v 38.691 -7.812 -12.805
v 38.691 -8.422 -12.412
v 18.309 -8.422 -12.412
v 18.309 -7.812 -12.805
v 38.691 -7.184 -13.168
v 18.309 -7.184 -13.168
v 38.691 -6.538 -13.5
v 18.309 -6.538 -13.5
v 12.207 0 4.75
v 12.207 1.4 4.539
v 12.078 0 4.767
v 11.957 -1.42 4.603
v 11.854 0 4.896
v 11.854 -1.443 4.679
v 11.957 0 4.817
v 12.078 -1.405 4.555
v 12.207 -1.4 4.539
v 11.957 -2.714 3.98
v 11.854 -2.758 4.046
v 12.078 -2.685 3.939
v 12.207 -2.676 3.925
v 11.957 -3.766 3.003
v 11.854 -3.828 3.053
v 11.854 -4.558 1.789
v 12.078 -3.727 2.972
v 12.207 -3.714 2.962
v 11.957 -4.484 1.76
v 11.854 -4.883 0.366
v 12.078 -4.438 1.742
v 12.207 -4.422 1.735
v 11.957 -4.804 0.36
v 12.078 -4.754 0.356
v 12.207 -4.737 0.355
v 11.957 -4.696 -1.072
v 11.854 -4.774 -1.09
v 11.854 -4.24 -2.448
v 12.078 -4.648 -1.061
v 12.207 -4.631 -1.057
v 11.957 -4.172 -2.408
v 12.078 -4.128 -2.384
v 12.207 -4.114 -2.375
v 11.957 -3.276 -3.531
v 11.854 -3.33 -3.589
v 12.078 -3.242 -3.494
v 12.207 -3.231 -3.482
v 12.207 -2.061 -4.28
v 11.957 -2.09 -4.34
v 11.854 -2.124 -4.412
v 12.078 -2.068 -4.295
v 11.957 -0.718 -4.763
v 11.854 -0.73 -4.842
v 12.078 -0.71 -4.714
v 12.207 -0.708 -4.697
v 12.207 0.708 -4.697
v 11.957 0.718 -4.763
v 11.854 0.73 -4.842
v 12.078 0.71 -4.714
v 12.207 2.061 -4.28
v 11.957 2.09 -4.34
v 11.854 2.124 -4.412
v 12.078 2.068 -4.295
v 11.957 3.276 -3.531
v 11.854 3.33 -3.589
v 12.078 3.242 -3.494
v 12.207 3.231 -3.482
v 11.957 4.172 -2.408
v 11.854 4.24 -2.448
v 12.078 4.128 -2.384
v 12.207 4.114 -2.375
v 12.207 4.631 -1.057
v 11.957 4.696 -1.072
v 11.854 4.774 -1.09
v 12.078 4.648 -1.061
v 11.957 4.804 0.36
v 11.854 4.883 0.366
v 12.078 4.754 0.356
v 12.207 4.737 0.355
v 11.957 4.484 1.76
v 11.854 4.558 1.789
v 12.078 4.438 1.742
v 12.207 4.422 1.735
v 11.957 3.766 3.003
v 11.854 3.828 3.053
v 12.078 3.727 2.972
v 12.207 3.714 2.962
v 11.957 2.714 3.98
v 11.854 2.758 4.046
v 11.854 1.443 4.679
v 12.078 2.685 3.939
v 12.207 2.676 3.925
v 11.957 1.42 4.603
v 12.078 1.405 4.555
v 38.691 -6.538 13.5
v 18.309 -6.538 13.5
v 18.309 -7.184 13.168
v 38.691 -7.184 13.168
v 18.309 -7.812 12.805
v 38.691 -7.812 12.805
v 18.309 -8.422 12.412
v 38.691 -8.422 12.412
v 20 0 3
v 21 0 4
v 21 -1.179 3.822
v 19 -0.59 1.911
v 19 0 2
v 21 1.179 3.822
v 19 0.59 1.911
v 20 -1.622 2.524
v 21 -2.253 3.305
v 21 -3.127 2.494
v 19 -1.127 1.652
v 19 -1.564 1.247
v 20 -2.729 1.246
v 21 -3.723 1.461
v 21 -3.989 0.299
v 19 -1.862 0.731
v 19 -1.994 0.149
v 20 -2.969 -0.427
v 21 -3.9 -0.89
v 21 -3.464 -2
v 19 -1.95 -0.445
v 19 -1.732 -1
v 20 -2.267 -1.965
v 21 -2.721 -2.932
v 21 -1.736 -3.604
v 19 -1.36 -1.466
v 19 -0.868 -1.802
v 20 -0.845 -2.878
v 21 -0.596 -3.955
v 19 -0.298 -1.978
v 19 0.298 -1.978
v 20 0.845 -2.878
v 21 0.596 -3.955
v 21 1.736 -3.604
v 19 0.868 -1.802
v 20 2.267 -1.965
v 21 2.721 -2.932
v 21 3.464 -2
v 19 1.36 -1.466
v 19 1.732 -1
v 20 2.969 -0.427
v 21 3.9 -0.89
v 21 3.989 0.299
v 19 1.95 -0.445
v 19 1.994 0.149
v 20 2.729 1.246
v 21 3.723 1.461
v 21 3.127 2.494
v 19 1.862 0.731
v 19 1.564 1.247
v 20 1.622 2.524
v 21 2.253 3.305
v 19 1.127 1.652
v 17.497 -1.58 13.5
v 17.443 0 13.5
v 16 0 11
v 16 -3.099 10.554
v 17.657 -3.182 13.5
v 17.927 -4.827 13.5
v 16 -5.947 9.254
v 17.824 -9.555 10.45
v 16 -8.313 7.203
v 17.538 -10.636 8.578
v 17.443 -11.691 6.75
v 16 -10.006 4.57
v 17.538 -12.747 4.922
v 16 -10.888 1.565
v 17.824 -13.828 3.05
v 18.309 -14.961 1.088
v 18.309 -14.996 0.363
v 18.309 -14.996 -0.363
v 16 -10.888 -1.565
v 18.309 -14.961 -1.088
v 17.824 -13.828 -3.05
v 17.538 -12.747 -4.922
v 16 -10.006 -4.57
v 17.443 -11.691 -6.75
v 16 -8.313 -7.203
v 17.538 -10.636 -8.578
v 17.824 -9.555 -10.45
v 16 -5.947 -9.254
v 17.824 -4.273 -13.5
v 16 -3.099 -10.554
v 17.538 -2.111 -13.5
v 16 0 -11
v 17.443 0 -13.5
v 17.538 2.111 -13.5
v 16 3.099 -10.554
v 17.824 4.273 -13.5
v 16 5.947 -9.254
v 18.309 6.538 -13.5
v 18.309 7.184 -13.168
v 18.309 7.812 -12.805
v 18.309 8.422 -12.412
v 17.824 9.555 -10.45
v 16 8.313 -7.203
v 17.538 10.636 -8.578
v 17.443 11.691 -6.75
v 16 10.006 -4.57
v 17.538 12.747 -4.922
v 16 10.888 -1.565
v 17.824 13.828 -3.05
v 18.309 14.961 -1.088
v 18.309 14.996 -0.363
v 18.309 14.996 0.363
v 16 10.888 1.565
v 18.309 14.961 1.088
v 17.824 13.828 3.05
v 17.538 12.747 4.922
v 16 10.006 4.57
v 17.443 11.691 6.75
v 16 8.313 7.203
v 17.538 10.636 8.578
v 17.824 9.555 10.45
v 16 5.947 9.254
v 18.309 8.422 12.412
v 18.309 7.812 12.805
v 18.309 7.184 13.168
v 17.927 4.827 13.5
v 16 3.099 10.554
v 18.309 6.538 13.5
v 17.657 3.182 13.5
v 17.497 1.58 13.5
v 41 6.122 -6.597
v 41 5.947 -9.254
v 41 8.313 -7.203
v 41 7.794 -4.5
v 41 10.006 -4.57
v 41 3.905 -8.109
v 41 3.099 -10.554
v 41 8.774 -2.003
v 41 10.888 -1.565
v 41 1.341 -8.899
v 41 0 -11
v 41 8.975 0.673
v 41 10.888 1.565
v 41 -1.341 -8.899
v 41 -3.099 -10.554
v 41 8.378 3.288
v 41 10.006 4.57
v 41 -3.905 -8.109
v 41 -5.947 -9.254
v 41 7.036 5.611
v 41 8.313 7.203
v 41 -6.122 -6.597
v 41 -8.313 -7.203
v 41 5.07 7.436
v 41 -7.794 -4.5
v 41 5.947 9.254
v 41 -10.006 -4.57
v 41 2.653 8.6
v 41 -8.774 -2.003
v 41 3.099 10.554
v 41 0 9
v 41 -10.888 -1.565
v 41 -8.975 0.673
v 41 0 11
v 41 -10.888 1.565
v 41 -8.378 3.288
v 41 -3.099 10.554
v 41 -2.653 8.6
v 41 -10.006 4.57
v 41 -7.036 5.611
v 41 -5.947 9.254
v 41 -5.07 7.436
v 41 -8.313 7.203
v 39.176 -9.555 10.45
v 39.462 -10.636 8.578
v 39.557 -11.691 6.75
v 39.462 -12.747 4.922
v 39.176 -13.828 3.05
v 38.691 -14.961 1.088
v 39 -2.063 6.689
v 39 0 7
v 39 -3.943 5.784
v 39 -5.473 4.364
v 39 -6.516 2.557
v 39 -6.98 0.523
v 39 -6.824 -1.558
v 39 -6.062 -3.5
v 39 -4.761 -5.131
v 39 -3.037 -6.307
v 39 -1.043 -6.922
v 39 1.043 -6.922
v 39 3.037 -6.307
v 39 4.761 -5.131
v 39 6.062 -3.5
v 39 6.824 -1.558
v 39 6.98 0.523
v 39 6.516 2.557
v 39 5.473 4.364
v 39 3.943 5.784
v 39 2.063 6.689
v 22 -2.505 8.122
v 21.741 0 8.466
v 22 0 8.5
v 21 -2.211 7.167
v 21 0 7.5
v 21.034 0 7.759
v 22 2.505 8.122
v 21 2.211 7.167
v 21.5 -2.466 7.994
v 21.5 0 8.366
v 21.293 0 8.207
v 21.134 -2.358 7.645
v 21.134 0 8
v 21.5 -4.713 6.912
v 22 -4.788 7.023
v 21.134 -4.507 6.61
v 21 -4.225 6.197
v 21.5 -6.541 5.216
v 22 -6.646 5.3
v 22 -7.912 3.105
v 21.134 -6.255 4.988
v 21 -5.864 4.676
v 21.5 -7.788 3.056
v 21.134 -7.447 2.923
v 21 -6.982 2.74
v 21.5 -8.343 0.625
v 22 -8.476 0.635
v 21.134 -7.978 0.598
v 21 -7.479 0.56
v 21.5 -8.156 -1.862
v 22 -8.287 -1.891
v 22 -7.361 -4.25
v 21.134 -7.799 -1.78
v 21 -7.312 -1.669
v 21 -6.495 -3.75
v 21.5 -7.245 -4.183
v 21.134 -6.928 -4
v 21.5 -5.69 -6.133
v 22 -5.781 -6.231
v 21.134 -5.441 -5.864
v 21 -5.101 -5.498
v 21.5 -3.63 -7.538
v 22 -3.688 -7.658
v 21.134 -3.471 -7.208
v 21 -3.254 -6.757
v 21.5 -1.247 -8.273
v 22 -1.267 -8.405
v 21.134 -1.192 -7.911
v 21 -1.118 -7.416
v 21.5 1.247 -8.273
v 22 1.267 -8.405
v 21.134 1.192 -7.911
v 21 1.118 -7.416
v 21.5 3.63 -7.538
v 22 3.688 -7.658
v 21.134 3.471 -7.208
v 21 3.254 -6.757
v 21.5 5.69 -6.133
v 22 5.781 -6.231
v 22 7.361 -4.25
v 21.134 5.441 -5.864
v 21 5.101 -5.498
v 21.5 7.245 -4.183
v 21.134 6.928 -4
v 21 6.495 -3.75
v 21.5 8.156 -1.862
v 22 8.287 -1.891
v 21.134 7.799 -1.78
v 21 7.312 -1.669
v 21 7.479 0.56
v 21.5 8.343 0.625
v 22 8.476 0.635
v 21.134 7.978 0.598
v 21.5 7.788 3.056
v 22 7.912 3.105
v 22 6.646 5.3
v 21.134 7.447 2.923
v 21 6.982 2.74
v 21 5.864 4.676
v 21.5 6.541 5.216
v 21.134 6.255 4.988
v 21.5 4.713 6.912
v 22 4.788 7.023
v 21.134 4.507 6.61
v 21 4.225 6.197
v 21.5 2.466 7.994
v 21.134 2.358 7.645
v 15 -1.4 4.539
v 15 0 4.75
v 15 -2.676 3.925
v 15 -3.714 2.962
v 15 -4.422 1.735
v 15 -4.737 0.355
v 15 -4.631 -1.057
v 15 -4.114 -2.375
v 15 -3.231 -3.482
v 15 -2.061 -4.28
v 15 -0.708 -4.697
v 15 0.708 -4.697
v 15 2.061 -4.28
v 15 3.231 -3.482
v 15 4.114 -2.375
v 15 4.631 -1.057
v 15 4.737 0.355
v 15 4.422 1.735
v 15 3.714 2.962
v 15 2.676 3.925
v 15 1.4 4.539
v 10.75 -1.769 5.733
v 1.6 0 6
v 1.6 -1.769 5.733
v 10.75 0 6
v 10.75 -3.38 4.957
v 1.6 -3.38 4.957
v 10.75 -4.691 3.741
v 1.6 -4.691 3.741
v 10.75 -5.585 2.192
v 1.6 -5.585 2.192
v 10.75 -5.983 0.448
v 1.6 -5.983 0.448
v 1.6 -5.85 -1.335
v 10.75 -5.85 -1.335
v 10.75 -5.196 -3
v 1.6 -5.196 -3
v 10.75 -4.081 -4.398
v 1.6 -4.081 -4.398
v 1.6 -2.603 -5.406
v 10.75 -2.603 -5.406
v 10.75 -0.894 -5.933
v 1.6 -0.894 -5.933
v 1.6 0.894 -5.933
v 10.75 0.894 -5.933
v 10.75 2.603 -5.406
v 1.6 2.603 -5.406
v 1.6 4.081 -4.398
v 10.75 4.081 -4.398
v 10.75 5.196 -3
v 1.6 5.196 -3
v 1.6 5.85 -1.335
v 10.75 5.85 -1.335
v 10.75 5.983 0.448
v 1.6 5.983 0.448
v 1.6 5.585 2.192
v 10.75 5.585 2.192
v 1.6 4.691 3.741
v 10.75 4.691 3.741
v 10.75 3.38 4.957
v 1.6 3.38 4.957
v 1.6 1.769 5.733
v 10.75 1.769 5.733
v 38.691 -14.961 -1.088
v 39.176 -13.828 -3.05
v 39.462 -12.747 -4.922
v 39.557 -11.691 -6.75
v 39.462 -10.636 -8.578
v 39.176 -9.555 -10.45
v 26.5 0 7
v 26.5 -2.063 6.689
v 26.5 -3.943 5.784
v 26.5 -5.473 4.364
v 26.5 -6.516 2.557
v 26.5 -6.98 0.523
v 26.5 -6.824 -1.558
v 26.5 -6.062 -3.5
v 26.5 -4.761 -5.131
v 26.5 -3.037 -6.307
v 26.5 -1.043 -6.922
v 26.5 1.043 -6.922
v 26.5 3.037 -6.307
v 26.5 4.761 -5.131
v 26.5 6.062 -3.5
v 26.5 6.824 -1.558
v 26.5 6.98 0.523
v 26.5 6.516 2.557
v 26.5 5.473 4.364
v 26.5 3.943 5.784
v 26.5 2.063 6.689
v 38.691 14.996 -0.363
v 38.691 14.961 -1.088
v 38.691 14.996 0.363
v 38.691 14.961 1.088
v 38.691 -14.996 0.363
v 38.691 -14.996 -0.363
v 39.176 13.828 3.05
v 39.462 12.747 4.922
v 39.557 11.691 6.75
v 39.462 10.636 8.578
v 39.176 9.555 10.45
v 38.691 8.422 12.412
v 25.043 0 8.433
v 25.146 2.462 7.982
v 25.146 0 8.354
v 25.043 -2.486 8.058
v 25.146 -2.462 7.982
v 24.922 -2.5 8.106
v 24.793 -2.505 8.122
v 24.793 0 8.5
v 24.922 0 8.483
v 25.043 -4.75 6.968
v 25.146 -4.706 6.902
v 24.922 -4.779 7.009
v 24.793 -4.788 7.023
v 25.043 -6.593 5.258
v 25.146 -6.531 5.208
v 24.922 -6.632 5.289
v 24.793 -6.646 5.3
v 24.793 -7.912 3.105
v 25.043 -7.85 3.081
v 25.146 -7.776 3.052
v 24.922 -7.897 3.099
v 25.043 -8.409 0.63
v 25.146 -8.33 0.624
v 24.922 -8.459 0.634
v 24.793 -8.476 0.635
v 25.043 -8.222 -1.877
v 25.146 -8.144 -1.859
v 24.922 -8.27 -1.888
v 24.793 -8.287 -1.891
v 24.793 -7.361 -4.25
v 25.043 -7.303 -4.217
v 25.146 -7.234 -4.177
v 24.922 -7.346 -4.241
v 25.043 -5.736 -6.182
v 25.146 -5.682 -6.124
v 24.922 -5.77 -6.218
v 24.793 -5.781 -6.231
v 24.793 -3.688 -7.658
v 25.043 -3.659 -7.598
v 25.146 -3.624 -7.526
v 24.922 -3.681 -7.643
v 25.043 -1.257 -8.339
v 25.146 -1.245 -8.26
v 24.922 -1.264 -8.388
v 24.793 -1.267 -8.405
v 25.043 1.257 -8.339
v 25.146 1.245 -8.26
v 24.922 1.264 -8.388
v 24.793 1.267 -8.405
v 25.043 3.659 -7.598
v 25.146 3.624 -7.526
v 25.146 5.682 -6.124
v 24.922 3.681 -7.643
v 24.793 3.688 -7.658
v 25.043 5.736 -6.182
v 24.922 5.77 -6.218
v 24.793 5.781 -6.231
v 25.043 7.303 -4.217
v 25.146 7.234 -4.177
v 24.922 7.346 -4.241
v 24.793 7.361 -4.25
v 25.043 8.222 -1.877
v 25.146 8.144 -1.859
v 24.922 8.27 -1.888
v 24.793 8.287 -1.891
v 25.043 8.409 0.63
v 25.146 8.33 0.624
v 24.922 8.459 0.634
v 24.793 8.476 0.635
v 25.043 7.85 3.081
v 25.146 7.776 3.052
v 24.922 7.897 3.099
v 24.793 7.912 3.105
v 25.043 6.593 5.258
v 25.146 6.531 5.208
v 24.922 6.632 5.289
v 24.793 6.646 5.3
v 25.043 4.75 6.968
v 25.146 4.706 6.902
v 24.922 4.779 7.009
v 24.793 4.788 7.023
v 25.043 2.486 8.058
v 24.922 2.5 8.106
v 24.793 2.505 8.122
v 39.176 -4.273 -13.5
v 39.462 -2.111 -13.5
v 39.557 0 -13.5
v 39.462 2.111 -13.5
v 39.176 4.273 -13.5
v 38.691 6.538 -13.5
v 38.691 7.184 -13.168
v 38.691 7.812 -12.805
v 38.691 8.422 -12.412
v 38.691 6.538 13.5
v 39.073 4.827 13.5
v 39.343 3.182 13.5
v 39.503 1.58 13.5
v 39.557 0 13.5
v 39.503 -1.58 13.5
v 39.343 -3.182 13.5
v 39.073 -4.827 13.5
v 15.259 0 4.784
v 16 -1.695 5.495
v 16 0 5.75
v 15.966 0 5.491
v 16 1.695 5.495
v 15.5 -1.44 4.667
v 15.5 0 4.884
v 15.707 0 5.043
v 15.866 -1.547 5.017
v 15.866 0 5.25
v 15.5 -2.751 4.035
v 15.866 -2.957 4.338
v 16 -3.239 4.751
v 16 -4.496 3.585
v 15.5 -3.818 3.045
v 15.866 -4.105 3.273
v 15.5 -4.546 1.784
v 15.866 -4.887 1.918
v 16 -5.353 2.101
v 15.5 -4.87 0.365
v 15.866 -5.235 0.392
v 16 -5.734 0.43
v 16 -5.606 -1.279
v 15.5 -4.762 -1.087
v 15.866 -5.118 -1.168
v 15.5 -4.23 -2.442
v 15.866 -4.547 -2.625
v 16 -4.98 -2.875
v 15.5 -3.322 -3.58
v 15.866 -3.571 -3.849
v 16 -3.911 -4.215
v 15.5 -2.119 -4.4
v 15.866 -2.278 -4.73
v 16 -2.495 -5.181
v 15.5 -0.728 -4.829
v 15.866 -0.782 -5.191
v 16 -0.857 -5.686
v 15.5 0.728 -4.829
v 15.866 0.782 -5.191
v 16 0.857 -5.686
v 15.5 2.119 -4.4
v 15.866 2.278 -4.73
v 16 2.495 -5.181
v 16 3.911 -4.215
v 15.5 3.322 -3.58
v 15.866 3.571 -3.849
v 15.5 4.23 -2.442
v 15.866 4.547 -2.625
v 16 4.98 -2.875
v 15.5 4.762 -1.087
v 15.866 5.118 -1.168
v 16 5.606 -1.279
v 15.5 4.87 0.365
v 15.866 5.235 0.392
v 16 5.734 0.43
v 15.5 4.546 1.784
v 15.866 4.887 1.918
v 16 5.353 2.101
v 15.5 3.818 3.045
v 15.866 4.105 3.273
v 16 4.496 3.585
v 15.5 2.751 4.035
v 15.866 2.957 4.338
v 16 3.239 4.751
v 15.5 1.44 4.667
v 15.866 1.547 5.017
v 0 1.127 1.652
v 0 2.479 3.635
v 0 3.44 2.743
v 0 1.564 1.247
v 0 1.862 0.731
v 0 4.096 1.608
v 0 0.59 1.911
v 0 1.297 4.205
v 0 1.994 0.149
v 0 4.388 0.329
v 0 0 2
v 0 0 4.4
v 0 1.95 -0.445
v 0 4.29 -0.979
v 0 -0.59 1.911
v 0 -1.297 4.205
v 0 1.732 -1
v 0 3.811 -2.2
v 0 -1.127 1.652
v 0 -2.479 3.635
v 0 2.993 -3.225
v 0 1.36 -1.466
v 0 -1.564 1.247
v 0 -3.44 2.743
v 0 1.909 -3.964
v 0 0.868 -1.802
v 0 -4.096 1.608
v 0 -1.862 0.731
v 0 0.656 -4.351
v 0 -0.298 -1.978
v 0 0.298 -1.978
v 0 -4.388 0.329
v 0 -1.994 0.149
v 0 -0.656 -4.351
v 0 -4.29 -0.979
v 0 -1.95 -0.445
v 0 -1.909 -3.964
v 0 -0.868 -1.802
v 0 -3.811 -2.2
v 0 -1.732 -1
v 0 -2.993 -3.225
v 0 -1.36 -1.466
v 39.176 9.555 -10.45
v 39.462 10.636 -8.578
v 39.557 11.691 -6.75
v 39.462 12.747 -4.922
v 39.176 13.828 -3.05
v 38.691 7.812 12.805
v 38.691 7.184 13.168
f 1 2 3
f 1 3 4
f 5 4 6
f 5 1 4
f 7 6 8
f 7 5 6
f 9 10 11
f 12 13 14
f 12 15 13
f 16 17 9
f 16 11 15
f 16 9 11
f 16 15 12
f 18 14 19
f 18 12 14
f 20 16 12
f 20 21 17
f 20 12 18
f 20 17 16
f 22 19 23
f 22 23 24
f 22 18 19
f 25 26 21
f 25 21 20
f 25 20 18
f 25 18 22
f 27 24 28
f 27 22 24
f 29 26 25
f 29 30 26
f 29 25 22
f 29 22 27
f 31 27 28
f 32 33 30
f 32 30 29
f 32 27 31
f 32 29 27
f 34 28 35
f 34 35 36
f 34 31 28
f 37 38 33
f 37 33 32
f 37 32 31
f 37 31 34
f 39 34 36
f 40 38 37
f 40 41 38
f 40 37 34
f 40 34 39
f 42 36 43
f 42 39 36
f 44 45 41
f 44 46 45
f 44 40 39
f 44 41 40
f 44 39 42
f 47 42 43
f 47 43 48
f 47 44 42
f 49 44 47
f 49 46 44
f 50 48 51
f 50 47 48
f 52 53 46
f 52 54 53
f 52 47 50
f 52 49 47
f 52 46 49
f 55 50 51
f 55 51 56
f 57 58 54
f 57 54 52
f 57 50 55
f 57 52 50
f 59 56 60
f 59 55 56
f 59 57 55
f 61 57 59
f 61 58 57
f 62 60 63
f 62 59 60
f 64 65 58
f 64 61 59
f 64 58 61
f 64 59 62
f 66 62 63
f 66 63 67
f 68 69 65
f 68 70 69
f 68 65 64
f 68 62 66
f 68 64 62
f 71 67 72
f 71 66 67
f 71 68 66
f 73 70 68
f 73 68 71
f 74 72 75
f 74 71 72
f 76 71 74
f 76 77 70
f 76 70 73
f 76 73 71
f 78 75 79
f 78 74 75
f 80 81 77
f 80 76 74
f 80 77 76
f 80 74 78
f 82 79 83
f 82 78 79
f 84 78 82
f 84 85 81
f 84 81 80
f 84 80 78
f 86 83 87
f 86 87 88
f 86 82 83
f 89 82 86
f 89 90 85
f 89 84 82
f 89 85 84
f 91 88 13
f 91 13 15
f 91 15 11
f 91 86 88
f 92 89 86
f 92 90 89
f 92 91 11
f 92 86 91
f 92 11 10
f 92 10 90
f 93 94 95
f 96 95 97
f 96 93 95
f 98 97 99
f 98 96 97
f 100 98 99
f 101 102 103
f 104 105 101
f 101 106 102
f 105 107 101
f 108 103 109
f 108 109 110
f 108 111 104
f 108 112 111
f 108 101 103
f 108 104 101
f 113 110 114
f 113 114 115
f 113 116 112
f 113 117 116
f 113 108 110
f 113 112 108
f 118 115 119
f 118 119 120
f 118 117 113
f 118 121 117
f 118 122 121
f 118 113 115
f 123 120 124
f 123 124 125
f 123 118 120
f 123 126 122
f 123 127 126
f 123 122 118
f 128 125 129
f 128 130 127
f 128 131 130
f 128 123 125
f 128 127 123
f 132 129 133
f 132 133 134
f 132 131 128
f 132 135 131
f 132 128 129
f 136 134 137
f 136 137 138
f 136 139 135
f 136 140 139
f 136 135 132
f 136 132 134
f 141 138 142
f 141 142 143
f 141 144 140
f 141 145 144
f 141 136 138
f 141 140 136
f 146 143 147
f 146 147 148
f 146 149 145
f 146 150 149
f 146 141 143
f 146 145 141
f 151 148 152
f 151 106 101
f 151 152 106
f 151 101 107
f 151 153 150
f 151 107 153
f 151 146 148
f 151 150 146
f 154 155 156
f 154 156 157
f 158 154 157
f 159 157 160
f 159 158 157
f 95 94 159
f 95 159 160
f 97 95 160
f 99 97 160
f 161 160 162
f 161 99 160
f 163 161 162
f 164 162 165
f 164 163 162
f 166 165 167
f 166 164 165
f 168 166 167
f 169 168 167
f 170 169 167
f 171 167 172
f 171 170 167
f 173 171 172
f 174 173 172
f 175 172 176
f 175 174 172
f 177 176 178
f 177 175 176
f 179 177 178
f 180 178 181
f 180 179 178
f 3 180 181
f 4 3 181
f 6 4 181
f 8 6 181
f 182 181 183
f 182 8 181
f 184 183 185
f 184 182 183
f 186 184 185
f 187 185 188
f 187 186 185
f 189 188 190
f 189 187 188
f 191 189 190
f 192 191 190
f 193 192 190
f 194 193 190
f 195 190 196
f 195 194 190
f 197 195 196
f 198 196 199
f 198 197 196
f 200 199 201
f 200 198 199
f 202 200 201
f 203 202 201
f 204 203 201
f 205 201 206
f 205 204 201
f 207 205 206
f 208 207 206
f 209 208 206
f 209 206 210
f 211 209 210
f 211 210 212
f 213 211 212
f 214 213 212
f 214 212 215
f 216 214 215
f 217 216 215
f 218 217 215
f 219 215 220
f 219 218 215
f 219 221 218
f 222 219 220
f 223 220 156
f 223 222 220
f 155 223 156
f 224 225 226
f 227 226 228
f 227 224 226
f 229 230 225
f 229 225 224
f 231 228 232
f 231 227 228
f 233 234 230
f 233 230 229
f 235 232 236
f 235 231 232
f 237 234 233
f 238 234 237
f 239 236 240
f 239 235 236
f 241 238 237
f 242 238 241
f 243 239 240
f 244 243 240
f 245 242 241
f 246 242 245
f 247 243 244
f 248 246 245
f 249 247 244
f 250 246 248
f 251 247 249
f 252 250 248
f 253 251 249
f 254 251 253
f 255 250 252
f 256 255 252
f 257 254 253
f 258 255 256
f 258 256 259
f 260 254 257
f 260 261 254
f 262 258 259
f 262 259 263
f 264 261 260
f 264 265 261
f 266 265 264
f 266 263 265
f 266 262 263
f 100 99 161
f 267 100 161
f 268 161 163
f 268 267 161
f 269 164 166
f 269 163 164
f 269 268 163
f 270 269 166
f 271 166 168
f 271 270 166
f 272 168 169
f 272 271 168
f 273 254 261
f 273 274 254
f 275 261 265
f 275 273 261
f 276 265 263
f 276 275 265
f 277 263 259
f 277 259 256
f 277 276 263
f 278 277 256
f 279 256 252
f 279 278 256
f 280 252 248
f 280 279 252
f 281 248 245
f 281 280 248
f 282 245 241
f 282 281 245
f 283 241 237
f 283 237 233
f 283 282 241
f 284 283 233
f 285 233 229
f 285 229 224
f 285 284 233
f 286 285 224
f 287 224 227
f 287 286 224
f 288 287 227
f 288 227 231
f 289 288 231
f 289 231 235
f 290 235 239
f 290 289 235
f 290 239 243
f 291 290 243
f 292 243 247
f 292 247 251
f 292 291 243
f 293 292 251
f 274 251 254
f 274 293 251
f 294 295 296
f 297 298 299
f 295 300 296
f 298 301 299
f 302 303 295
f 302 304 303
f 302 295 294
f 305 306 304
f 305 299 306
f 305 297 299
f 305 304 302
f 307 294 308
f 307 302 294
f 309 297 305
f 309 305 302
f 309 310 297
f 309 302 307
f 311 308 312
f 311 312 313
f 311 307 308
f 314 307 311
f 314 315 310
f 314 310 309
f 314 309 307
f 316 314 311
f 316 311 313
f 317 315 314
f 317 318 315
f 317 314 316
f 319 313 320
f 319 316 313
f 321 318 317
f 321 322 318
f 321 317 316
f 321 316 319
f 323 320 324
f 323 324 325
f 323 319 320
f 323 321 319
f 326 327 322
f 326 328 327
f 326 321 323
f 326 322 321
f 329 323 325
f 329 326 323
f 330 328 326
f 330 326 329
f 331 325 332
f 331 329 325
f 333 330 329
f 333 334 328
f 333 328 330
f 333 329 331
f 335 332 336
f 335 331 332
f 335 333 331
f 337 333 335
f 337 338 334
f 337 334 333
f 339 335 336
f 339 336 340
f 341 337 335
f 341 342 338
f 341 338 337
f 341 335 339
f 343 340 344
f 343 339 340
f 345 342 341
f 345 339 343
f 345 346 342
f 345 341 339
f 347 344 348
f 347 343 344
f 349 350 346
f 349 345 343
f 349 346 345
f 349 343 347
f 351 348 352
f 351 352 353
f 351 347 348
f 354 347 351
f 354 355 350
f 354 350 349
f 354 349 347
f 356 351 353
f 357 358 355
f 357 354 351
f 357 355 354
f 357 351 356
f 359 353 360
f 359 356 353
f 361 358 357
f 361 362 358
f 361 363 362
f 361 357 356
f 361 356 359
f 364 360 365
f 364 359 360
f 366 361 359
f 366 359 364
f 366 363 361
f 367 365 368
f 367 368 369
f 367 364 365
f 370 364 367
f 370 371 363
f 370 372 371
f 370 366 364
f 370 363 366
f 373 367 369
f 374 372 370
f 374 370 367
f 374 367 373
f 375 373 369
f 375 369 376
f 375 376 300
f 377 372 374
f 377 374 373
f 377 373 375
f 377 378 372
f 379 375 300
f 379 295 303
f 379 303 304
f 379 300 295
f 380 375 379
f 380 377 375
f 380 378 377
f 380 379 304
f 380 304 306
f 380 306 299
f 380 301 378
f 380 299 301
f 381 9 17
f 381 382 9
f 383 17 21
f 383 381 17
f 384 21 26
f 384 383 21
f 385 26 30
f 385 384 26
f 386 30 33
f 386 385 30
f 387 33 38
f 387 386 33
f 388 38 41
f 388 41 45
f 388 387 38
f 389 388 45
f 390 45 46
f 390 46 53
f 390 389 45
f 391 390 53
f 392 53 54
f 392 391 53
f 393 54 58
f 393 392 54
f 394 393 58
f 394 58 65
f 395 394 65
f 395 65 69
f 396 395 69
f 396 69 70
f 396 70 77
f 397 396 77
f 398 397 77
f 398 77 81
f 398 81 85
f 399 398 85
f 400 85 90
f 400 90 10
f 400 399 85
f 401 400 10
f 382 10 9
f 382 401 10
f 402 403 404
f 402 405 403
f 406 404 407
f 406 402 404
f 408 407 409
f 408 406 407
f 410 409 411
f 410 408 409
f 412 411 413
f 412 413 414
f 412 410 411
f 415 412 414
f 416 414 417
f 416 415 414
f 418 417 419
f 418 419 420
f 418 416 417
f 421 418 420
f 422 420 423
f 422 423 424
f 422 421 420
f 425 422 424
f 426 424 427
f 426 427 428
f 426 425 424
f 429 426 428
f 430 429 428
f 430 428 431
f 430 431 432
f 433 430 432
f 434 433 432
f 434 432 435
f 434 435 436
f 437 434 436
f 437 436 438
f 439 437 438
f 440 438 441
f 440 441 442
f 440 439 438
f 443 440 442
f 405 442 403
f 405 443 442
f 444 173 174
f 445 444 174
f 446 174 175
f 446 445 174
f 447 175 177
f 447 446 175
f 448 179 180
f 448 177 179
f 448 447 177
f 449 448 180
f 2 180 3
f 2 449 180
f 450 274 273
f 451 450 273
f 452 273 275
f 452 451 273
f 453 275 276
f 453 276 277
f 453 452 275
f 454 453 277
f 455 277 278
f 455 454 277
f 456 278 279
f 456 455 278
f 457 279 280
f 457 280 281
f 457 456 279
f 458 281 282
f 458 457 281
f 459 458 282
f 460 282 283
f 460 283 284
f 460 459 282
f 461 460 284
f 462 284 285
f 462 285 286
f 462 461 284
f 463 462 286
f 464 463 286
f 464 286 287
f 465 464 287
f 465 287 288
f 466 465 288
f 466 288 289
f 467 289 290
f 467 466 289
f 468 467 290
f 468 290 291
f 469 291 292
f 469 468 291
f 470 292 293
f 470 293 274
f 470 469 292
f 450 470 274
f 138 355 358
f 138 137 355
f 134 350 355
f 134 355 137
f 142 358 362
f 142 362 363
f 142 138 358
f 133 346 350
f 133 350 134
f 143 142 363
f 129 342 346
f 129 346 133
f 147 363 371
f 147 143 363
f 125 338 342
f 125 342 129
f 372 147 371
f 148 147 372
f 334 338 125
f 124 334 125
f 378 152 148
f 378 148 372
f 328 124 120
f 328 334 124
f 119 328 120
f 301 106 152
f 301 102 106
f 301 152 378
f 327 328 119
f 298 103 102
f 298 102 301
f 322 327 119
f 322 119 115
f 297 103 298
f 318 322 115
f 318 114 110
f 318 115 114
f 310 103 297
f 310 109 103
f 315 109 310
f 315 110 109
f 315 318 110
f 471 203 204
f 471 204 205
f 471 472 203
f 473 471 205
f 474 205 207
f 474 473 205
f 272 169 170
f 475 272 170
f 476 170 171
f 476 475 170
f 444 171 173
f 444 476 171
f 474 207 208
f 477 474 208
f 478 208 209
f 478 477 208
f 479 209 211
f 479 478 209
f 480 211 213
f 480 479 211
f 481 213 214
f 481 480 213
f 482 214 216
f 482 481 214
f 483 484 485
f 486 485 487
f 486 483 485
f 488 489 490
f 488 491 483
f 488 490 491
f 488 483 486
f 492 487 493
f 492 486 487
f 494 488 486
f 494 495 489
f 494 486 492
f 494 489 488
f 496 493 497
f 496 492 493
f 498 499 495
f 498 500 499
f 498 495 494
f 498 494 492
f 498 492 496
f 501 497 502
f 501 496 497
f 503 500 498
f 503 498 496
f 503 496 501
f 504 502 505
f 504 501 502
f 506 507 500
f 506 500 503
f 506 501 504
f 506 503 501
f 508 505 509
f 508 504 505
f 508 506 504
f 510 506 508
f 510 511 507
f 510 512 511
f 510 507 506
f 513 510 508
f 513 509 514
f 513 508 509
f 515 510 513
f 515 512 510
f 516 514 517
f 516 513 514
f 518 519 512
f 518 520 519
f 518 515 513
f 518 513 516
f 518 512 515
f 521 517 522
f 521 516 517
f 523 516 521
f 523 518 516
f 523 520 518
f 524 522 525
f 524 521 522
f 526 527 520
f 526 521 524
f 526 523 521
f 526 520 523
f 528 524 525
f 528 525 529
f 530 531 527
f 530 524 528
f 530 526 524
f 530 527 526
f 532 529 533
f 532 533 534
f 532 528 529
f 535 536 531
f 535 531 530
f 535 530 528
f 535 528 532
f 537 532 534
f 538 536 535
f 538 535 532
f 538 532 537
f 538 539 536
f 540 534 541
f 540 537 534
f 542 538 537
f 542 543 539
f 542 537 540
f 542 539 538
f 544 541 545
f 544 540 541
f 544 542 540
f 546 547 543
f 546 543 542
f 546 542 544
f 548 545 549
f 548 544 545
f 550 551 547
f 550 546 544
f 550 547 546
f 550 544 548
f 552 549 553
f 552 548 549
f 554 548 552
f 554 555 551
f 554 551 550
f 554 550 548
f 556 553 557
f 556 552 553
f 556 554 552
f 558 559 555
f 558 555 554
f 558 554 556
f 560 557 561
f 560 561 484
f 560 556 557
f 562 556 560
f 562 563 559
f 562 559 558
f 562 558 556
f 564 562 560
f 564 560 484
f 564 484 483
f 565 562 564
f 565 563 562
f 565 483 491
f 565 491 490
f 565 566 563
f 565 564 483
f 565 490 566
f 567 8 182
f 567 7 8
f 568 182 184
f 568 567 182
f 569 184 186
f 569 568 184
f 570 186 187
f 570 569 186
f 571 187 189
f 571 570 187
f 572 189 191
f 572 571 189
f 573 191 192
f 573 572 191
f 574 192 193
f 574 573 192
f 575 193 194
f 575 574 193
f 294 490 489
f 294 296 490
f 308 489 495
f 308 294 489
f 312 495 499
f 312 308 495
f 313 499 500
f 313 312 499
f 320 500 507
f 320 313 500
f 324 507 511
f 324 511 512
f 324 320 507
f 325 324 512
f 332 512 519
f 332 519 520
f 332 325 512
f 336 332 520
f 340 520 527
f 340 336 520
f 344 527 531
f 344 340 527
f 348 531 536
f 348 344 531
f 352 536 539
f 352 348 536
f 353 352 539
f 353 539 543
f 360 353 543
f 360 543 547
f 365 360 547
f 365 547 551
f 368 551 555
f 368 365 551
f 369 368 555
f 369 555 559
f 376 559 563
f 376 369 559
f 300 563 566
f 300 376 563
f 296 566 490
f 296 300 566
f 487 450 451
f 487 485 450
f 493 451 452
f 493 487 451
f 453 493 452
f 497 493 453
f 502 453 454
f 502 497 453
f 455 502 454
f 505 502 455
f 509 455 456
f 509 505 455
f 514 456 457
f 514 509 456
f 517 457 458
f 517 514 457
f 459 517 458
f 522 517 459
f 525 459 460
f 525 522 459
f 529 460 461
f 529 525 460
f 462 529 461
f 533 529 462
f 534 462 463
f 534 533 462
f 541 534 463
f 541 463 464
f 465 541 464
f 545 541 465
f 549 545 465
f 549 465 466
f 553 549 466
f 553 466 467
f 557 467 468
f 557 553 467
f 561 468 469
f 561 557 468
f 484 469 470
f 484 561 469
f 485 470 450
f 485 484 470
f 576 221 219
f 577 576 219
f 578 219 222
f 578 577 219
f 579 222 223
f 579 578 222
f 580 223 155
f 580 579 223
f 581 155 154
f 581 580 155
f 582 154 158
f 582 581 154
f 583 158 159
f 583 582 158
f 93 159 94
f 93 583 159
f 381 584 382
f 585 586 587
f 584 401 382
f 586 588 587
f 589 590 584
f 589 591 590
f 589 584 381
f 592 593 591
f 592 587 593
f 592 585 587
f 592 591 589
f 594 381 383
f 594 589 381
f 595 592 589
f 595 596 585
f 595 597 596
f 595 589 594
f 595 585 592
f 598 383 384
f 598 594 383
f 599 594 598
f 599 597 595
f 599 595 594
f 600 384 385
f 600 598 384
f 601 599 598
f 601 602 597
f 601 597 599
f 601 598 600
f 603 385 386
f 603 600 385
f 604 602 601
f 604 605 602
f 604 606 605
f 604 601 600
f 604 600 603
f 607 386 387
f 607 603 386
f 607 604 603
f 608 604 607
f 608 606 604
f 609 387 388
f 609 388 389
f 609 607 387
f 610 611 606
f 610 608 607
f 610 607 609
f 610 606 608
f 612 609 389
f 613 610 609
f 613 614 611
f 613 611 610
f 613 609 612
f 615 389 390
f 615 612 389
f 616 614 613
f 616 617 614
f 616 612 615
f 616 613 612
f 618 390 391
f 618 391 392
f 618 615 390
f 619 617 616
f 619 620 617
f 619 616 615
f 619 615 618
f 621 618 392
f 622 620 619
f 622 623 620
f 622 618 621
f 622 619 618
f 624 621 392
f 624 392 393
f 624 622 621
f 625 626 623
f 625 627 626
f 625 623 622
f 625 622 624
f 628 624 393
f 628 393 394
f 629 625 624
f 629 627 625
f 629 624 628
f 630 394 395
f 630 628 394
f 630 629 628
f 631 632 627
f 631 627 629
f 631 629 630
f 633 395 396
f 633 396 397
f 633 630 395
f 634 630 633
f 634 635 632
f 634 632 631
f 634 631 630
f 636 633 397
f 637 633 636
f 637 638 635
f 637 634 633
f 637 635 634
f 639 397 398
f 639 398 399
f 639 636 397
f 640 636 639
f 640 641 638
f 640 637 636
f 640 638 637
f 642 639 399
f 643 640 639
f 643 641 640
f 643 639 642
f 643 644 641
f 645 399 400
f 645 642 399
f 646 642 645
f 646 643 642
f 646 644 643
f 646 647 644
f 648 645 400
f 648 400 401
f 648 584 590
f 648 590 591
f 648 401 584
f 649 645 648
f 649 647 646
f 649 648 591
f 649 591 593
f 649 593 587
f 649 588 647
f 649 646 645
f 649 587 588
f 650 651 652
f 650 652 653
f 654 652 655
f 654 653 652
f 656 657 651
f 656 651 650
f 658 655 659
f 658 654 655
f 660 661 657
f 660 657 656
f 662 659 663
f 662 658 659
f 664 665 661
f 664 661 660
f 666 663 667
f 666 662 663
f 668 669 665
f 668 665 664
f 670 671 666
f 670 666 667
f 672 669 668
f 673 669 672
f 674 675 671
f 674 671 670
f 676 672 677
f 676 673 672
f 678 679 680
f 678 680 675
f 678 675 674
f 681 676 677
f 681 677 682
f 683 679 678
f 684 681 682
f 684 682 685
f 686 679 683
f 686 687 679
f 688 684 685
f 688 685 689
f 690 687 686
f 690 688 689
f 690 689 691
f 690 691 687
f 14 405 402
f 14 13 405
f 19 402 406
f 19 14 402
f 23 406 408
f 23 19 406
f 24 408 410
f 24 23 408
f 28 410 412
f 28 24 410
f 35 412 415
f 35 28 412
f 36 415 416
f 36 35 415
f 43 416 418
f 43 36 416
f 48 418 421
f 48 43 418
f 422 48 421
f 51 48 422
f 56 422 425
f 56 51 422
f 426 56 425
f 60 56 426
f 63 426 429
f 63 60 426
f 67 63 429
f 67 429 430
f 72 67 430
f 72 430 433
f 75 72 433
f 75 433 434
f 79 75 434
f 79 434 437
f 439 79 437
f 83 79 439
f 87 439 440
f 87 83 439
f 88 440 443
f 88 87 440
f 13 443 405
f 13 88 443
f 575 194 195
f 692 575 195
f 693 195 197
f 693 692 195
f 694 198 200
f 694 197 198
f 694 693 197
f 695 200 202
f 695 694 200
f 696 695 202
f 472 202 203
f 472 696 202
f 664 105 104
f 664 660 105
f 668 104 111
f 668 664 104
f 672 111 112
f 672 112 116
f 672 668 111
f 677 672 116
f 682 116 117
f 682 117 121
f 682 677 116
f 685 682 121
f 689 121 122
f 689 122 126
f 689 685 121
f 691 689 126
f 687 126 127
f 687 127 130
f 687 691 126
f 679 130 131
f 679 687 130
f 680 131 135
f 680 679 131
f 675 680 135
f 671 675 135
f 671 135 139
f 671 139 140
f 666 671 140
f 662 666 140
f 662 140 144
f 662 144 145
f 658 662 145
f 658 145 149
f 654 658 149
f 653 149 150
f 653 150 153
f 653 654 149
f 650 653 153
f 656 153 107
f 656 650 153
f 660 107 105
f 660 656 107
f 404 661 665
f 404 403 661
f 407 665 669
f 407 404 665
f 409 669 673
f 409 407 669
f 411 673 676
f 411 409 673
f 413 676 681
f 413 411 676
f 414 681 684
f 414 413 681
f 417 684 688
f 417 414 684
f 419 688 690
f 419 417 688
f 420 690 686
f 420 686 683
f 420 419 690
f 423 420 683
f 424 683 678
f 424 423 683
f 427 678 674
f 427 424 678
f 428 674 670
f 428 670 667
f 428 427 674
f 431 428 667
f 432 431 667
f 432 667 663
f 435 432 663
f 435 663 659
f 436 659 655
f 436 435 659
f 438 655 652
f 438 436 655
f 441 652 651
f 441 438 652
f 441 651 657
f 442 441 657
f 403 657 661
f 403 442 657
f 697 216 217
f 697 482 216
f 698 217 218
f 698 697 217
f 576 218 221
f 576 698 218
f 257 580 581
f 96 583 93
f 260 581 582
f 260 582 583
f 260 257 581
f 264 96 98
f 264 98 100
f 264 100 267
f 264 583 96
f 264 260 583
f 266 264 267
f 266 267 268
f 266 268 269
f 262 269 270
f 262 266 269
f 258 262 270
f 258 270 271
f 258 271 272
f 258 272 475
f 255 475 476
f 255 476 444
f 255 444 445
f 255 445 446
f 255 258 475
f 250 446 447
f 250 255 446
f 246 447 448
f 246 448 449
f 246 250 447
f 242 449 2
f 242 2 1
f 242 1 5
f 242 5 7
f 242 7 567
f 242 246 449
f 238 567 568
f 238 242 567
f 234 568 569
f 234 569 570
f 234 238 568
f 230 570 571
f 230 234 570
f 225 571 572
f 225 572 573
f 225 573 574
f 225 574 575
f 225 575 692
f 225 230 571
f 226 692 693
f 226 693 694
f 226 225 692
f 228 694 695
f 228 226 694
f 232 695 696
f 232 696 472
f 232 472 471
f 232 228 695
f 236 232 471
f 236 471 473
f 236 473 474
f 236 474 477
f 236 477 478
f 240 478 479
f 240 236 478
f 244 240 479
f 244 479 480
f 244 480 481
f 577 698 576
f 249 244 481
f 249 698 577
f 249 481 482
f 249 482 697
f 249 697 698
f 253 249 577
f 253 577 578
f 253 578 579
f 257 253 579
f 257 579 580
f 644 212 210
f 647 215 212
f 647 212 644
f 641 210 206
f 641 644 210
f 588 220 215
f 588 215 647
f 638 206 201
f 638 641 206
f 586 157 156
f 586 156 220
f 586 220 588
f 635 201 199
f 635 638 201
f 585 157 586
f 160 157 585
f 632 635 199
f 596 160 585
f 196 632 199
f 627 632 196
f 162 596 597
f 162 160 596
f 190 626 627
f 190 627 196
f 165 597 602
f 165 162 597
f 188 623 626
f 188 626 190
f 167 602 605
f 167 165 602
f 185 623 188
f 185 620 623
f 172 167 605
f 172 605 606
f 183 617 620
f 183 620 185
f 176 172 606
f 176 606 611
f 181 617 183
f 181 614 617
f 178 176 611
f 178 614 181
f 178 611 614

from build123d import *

# Parameters (mm, degrees)
SKETCH_2_OUTSIDE_W  = 43.8
SKETCH_2_OUTSIDE_H  = 43.8
CUT_EXTRUDE_1_DEPTH = 47.16275555


with BuildPart() as part:
    # Эскиз1 → Повернуть1 (revolve)
    with BuildSketch(Plane.XY, mode=Mode.PRIVATE) as revolve_1_sk:
        with BuildLine():
            Line((0, 2), (0, 4.4))
            Line((0, 4.4), (1.6, 6))
            Line((1.6, 6), (10.75, 6))
            Line((10.75, 6), (11.853553391, 4.896446609))
            ThreePointArc((11.853553391, 4.896446609), (12.015765065, 4.788060234), (12.207106781, 4.75))
            Line((12.207106781, 4.75), (15, 4.75))
            ThreePointArc((15, 4.75), (15.707106781, 5.042893219), (16, 5.75))
            Line((16, 5.75), (16, 11))
            Line((16, 11), (18.309401077, 15))
            Line((18.309401077, 15), (38.690598923, 15))
            Line((38.690598923, 15), (41, 11))
            Line((41, 11), (41, 9))
            Line((41, 9), (39, 7))
            Line((39, 7), (26.5, 7))
            Line((26.5, 7), (25.146446609, 8.353553391))
            ThreePointArc((25.146446609, 8.353553391), (24.984234935, 8.461939766), (24.792893219, 8.5))
            Line((24.792893219, 8.5), (22, 8.5))
            ThreePointArc((22, 8.5), (21.292893219, 8.207106781), (21, 7.5))
            Line((21, 7.5), (21, 4))
            Line((21, 4), (19, 2))
            Line((19, 2), (0, 2))
        make_face()
    revolve(revolve_1_sk.sketch.rotate(Axis((0, 0, 0), (1, 0, 0)), 90), axis=Axis((0, 0, 0), (1, 0, 0)))

    # Эскиз2 outside → Вырез-Вытянуть1 (cut, through all)
    with BuildSketch(Plane(origin=(41, 0, 0), x_dir=(0, 0, -1), z_dir=(1, 0, 0))):
        Rectangle(SKETCH_2_OUTSIDE_W, SKETCH_2_OUTSIDE_H)
        Polygon((0, 15.588457268), (-13.5, 7.794228634), (-13.5, -7.794228634), (0, -15.588457268), (13.5, -7.794228634), (13.5, 7.794228634), align=None, mode=Mode.SUBTRACT)
    extrude(amount=-CUT_EXTRUDE_1_DEPTH, mode=Mode.SUBTRACT)


solid = part.part
